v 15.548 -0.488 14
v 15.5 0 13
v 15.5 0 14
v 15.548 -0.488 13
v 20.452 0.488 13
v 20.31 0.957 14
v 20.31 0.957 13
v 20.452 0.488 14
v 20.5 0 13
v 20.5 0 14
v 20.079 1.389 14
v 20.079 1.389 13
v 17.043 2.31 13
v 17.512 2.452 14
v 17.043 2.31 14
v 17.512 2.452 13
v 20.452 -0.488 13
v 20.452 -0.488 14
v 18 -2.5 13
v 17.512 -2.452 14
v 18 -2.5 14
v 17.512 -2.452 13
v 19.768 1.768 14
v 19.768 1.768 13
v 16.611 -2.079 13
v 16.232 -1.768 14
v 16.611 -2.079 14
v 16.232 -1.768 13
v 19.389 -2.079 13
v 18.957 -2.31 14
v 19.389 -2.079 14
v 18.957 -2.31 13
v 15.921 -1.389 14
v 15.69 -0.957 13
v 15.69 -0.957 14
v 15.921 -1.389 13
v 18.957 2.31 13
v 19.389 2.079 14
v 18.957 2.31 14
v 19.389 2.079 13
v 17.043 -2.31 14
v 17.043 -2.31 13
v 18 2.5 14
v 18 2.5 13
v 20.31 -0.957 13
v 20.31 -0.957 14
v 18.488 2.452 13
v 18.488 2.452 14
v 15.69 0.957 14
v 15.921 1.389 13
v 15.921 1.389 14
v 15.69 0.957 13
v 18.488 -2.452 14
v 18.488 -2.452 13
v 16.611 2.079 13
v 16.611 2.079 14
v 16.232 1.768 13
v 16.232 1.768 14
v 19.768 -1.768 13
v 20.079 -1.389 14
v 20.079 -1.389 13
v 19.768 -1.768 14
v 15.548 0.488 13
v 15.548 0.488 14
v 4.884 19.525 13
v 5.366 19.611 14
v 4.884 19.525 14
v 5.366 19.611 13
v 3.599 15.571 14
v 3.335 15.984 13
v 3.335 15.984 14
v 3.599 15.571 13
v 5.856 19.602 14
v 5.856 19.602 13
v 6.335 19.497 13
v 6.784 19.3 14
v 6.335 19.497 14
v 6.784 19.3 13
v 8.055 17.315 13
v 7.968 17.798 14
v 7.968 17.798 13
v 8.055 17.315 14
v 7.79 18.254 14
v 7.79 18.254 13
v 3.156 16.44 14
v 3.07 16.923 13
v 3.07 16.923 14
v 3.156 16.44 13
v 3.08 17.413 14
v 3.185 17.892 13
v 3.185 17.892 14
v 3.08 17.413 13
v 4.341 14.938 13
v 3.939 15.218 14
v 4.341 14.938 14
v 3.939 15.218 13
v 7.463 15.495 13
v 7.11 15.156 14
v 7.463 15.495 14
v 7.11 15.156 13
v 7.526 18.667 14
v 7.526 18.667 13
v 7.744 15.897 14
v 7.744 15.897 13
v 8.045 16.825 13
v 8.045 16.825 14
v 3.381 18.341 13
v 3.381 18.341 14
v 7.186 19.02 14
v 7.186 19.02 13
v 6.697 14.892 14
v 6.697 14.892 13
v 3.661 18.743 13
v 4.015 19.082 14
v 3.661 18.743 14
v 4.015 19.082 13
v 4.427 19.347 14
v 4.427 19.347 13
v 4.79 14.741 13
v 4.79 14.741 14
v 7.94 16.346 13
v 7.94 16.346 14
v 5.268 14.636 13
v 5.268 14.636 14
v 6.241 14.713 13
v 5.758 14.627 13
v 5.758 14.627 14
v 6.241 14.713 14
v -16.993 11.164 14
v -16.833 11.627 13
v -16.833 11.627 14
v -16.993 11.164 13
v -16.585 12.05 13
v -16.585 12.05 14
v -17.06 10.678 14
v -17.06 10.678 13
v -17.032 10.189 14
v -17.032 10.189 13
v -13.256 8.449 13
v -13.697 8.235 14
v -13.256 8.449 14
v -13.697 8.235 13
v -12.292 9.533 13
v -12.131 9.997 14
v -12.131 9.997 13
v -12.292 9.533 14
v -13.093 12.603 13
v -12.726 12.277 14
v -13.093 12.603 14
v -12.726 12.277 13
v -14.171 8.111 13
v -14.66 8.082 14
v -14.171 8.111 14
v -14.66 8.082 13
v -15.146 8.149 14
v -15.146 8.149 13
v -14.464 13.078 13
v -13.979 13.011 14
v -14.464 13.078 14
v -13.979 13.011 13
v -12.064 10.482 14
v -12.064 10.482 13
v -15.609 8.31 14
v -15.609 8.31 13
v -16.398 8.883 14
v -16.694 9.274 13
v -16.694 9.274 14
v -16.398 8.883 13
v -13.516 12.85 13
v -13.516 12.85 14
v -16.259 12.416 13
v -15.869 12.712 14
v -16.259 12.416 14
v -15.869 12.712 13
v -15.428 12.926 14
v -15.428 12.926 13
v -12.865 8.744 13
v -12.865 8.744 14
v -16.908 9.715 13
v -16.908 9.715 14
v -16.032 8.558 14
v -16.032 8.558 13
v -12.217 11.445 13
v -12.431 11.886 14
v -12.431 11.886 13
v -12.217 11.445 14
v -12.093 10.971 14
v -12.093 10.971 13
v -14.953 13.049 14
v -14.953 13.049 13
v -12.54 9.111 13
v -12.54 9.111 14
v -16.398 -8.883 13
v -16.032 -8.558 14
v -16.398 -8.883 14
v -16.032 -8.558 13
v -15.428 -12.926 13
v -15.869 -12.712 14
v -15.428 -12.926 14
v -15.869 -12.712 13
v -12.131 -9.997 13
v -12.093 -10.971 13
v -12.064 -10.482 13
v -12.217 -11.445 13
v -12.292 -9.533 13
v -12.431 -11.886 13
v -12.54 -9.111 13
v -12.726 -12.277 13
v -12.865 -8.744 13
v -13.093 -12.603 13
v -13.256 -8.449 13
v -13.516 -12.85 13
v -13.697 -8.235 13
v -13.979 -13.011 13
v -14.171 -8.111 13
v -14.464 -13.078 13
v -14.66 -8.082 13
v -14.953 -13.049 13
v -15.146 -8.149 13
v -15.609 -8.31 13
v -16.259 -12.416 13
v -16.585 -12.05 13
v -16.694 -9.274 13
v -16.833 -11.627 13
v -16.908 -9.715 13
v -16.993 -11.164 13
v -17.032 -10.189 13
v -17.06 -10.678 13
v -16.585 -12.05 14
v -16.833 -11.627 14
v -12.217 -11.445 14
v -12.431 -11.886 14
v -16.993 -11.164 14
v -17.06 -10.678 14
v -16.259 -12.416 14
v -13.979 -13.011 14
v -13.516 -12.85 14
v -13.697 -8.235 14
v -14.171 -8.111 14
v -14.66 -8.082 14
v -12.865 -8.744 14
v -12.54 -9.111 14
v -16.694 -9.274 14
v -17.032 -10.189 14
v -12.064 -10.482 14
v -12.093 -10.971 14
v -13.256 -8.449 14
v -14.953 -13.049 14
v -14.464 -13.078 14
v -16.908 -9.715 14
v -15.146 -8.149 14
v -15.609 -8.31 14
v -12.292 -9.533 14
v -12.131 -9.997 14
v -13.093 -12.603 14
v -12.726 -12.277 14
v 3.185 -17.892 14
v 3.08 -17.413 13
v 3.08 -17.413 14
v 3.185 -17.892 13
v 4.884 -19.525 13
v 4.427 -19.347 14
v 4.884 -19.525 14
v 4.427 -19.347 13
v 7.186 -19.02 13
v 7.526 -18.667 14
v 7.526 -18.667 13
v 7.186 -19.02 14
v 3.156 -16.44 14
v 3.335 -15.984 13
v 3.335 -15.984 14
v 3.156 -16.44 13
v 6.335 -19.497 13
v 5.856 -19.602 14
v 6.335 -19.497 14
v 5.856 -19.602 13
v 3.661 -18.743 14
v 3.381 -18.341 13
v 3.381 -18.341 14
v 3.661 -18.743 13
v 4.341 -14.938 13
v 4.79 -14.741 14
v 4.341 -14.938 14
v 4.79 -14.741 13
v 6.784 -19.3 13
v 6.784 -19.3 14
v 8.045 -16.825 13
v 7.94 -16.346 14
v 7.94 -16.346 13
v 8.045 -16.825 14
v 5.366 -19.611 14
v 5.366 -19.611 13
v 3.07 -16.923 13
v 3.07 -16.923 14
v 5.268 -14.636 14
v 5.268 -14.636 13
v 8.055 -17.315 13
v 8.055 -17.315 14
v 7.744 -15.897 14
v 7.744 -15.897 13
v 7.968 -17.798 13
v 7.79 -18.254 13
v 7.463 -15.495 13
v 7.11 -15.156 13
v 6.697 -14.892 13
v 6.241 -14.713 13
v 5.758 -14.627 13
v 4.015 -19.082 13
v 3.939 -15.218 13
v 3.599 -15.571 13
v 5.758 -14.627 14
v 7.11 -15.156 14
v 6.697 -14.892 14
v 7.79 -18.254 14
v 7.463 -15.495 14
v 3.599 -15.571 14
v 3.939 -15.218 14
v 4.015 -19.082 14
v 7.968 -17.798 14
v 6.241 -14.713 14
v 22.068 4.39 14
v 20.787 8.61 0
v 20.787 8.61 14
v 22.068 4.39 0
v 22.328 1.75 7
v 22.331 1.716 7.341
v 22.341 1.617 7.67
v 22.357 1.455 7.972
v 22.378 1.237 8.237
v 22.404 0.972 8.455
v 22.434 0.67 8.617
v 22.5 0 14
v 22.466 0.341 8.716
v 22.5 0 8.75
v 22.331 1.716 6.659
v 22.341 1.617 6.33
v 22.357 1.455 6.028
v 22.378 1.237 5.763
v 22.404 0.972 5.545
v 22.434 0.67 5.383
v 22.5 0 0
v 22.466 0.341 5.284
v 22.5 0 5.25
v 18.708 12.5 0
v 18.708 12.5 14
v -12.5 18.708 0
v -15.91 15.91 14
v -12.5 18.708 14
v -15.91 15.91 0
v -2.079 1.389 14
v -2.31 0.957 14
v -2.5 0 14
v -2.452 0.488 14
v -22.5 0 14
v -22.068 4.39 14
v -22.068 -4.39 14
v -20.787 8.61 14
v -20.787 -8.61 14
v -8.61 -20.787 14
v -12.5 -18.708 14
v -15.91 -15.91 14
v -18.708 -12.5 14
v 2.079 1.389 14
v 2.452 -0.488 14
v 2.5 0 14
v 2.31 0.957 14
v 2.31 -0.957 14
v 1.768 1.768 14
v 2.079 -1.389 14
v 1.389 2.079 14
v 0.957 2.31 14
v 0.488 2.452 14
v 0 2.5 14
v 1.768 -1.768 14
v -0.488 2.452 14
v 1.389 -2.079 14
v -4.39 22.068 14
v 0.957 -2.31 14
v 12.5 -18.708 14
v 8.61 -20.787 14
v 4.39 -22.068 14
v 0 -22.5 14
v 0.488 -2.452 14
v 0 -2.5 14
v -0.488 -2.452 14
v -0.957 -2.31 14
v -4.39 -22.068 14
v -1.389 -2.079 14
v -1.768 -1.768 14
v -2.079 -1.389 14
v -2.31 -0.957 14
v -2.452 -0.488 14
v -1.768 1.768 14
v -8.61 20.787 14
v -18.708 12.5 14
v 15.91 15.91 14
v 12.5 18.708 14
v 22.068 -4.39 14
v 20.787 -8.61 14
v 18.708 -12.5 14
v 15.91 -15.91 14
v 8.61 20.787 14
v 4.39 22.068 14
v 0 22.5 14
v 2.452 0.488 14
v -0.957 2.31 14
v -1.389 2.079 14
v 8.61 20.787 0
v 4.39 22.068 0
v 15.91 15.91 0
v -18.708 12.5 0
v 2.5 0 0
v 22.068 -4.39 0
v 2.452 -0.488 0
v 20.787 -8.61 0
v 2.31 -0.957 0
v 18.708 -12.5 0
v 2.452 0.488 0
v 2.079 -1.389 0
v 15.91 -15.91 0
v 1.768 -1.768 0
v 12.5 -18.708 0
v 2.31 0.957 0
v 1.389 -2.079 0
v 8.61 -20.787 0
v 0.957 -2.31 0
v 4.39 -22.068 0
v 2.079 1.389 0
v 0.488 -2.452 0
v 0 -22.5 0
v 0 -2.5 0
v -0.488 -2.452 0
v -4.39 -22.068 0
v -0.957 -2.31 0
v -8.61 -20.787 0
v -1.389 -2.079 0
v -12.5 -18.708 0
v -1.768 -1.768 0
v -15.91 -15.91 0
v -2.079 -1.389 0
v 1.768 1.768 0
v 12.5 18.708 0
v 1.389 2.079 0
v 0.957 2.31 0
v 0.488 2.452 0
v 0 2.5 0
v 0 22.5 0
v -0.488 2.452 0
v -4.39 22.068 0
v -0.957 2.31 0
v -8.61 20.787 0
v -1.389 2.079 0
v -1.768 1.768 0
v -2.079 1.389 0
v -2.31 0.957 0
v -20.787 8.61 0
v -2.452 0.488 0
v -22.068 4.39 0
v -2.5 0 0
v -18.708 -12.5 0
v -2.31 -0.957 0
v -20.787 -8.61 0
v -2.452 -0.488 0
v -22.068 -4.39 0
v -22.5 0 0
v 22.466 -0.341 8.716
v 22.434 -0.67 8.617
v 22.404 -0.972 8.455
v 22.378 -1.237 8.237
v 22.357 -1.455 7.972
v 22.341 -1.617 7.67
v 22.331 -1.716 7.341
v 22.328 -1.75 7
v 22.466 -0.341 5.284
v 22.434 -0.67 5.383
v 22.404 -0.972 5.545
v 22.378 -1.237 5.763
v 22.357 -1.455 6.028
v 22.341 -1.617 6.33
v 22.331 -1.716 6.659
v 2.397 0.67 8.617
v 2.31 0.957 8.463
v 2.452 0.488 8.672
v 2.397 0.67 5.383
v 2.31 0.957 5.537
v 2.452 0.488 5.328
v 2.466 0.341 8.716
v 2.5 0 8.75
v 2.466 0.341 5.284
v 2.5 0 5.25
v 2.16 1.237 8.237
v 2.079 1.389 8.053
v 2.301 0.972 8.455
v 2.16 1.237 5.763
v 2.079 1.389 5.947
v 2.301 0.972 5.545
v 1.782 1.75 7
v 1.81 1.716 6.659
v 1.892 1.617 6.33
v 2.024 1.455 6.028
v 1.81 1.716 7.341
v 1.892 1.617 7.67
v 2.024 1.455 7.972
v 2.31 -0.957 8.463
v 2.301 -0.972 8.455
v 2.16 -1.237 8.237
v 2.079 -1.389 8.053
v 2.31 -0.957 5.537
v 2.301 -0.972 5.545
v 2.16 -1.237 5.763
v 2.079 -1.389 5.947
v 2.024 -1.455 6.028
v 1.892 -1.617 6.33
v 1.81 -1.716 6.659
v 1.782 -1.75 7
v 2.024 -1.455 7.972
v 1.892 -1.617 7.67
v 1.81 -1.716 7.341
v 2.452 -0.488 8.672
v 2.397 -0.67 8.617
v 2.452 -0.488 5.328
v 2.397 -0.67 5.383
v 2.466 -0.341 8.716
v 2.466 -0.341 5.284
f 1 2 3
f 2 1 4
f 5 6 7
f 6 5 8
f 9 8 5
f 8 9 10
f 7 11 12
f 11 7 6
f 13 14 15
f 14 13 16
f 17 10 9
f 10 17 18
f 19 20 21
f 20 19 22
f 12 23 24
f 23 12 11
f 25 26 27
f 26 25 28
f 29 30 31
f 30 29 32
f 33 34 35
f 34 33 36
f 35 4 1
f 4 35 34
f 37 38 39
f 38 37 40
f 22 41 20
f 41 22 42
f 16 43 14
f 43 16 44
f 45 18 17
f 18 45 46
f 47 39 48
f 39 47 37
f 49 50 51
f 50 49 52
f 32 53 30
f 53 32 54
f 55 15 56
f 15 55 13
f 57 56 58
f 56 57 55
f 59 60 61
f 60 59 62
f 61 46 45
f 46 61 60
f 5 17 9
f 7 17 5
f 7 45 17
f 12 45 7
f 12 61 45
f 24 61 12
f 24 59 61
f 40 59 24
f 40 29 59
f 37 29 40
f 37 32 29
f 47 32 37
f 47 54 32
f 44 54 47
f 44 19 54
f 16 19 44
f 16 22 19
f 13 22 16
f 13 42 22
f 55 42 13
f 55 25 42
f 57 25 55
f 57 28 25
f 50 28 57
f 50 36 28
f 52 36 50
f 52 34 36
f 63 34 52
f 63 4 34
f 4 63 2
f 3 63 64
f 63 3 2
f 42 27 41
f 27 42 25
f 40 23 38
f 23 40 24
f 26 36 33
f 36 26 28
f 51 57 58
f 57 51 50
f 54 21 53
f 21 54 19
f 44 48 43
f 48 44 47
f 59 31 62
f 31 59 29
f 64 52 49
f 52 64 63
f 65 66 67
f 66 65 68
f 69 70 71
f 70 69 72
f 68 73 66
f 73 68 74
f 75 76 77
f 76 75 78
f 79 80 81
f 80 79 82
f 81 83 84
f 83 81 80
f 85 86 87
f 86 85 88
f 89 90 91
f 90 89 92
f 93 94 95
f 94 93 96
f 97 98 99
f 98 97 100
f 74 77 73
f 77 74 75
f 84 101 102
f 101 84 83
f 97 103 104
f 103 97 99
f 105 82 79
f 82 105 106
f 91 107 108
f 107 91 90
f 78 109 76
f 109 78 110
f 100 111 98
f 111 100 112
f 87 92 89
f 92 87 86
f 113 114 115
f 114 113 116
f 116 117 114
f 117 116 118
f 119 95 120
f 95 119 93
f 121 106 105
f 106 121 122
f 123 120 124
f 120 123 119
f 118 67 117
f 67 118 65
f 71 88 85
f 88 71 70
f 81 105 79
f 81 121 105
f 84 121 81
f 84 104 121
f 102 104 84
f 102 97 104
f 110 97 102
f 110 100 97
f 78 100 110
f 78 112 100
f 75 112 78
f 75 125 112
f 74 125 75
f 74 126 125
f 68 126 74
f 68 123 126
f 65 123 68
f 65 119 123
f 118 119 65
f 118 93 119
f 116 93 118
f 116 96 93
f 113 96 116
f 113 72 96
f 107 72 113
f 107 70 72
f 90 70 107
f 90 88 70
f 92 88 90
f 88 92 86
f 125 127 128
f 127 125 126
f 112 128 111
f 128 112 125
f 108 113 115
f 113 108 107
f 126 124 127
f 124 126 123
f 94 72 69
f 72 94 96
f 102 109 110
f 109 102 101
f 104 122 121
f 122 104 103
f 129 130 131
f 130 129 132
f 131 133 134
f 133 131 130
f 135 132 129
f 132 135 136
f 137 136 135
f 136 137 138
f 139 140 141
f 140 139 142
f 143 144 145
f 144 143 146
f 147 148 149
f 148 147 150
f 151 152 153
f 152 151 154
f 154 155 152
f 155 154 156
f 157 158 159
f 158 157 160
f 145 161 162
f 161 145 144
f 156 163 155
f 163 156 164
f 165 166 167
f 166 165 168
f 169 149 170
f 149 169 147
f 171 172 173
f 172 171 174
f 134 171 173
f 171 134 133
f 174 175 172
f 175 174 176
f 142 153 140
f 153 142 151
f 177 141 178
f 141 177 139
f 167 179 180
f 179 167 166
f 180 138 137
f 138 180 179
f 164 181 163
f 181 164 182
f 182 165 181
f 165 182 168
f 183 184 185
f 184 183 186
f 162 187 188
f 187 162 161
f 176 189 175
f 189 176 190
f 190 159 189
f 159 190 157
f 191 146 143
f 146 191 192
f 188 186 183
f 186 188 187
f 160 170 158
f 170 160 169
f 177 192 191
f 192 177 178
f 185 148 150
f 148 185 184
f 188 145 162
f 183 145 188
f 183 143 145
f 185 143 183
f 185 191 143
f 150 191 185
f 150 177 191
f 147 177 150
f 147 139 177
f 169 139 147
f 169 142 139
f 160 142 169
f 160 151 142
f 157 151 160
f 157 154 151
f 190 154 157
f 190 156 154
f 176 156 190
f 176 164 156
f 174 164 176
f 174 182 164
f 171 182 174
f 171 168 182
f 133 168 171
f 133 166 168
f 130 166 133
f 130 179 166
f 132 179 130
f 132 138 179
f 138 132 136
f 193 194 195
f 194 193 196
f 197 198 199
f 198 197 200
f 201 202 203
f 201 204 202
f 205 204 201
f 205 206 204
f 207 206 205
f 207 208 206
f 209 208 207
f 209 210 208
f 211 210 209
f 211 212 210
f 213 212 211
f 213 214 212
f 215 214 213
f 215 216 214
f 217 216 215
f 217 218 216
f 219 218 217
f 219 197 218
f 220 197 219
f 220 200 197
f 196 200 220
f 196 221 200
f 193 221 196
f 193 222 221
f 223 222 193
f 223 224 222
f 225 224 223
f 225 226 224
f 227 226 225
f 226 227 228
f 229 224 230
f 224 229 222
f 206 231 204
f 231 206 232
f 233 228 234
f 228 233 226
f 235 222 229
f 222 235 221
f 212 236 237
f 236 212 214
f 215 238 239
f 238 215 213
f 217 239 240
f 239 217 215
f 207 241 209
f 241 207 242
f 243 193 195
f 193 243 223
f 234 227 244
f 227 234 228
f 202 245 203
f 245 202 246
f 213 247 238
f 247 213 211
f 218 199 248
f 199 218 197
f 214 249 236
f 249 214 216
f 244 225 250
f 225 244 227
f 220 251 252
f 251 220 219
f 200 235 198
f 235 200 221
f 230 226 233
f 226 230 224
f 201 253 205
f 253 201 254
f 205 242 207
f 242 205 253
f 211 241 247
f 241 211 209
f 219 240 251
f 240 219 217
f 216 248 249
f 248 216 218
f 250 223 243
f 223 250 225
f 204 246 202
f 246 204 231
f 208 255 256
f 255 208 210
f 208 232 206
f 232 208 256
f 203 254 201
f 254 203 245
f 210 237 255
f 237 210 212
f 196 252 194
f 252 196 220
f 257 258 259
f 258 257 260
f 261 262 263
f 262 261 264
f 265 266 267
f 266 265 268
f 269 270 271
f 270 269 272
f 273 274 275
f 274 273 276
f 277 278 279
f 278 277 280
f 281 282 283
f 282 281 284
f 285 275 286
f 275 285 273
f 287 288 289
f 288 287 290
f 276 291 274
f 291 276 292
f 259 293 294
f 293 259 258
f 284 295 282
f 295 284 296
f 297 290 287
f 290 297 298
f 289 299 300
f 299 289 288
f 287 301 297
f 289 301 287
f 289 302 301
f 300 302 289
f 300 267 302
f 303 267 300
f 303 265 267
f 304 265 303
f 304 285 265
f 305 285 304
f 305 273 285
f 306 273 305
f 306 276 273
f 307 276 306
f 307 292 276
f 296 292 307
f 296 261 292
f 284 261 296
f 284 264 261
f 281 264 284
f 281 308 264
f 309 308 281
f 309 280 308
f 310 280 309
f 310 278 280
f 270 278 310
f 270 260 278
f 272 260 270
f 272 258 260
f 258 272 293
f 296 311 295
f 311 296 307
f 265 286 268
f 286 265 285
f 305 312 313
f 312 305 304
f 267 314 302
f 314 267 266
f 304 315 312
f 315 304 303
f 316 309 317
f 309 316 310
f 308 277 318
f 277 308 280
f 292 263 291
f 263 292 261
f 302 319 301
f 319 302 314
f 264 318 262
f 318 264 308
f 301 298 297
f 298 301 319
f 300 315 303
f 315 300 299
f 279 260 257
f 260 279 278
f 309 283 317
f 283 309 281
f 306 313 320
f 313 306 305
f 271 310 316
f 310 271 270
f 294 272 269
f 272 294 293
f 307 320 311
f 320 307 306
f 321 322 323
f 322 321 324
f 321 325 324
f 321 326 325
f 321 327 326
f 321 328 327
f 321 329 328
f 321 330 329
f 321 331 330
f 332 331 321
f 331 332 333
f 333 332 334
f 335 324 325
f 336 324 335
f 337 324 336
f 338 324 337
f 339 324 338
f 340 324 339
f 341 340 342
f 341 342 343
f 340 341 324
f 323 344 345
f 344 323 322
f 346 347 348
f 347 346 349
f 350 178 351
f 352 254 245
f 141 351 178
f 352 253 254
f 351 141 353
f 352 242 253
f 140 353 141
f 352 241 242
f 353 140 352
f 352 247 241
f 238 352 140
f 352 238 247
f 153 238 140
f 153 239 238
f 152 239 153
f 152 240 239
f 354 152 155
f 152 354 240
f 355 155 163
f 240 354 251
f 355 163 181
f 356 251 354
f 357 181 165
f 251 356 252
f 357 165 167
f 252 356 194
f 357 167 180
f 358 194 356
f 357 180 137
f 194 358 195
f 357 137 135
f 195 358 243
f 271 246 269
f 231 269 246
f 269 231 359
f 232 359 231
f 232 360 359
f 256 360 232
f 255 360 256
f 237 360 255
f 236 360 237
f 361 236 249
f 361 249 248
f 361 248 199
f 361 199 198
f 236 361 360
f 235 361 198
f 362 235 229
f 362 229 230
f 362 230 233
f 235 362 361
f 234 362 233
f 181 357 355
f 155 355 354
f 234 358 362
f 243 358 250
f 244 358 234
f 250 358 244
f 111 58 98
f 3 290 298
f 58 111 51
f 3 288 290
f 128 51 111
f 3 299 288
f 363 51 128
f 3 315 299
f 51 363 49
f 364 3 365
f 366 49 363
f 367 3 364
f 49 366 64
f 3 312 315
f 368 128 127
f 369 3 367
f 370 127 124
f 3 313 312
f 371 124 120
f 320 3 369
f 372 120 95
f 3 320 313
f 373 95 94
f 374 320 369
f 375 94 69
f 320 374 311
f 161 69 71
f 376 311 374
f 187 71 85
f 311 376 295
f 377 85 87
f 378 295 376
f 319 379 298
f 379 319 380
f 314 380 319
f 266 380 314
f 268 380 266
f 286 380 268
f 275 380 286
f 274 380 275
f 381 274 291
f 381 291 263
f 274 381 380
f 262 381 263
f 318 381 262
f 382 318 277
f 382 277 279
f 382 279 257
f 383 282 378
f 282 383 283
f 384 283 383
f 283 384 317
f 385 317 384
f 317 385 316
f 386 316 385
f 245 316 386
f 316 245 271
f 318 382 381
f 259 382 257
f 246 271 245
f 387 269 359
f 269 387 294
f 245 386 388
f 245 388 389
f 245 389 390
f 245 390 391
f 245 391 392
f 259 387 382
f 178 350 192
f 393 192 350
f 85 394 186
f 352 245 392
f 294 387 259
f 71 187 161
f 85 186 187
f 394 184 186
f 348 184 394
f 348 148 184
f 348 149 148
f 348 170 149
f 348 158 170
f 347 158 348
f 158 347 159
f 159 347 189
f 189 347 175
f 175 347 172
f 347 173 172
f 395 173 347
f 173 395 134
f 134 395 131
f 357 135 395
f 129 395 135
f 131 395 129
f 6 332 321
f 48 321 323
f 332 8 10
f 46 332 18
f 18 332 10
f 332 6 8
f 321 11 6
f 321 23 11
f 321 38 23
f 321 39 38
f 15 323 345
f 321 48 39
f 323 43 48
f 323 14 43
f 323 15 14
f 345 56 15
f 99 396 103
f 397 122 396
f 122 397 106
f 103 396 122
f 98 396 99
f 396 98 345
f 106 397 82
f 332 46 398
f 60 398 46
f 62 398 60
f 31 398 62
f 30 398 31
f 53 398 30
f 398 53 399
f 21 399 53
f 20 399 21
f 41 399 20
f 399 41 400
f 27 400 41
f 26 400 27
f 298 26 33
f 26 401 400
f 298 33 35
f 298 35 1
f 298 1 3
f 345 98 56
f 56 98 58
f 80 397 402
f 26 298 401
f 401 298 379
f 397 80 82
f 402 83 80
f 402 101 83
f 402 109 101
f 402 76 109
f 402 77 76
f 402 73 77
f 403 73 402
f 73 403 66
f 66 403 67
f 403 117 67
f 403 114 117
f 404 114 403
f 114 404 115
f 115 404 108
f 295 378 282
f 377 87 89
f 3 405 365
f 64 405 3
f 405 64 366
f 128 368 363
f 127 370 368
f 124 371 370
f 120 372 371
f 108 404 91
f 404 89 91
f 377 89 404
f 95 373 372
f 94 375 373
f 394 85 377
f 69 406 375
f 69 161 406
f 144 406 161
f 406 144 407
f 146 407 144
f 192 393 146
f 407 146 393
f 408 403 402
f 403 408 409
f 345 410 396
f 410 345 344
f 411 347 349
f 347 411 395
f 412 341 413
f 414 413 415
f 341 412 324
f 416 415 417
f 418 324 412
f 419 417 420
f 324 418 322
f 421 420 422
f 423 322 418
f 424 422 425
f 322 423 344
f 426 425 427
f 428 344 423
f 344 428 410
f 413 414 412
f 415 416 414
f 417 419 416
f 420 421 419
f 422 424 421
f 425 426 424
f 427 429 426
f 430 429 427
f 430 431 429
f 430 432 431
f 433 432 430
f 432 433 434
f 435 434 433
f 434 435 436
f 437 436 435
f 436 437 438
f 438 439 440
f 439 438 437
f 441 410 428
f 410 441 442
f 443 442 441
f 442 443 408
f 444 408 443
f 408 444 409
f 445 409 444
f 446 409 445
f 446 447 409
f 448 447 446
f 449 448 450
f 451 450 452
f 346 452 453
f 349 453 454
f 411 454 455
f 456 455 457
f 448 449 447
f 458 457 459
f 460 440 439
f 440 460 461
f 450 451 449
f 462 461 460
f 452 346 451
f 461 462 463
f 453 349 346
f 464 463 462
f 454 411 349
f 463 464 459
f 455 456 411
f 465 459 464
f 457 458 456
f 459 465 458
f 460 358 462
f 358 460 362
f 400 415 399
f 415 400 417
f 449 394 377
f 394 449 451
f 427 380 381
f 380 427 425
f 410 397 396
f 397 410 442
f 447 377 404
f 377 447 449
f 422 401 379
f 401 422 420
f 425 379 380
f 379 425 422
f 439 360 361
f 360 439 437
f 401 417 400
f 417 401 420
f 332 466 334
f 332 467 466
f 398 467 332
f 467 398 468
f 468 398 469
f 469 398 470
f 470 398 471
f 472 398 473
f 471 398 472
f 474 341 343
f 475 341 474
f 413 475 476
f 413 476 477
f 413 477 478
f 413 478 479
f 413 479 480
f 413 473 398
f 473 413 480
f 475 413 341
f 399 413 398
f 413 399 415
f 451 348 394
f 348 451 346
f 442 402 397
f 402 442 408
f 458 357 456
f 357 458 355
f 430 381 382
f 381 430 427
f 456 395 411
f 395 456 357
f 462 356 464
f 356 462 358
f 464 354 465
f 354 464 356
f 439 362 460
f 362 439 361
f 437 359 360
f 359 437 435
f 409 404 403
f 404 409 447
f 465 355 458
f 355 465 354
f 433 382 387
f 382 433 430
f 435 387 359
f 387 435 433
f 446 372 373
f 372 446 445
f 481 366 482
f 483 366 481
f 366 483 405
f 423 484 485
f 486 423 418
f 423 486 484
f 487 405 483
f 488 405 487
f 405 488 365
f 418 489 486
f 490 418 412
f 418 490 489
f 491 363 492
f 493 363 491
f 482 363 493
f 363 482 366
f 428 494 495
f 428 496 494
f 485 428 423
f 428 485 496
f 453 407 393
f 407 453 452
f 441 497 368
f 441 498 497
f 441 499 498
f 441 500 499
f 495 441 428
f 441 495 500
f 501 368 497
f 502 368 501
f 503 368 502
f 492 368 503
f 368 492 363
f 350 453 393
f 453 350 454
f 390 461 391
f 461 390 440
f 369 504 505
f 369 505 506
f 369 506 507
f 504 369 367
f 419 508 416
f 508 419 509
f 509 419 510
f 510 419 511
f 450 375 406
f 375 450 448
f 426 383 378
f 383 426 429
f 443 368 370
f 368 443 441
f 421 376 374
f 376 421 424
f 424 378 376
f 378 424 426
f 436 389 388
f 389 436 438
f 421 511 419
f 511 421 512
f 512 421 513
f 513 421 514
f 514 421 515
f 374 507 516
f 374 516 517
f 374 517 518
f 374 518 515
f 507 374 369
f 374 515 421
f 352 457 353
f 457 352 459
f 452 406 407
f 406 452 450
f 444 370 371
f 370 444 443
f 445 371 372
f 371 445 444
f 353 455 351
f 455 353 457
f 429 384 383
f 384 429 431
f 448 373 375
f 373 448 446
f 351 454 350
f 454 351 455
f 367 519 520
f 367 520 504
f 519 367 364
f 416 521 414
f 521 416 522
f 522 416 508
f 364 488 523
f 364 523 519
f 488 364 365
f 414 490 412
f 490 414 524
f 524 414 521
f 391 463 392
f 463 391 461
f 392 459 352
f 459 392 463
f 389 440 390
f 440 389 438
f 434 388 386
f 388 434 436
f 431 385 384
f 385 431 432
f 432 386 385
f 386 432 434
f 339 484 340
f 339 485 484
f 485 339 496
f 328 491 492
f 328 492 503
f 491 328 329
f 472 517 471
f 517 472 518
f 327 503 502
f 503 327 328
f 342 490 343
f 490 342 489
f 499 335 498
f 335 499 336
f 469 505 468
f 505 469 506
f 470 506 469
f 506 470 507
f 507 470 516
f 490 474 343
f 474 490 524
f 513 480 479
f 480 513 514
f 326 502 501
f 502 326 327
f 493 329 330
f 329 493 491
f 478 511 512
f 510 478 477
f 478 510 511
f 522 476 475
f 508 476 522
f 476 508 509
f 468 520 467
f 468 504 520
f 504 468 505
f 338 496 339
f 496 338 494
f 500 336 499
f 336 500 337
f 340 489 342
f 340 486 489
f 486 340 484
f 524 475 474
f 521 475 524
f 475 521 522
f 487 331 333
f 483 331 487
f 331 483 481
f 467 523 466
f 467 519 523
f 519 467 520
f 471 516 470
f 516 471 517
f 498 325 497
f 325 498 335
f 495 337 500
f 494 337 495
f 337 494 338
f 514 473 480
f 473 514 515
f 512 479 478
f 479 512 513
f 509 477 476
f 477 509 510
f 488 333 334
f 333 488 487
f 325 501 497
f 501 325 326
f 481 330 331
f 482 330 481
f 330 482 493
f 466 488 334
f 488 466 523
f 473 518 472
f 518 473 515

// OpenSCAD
$fn = 32;

// ----------------------------------------------------------------------
// Control knob: dimpled knob
// ----------------------------------------------------------------------

// --- parameters (mm) ---
dimp_d = 5;               // finger dimple diameter
n_dimp = 5;               // number of dimples
dimp_r = 18;              // dimple ring radius
knob_d = 45;              // knob body diameter
knob_h = 14;              // knob body height
bore_d = 5;               // shaft bore diameter
set_d = 3.5;              // set screw bore diameter
fit_tol = 0.05;           // tolerance for press fits, mm
free_tol = 0.3;           // tolerance for clearance fits, mm

dimp_step = 360 / n_dimp;  // dimple angular step

difference() {
  cylinder(h = knob_h, d = knob_d);
  translate([0, 0, -1]) cylinder(h = knob_h + 2, d = bore_d);
  translate([-1, 0, knob_h / 2]) rotate([0, 90, 0])
    cylinder(h = knob_d / 2 + bore_d / 2 + 2, d = set_d);  for (i = [0 : n_dimp - 1])
    rotate([0, 0, i * dimp_step])
      translate([dimp_r, 0, knob_h - 1])
        cylinder(h = 2, d = dimp_d);
}
